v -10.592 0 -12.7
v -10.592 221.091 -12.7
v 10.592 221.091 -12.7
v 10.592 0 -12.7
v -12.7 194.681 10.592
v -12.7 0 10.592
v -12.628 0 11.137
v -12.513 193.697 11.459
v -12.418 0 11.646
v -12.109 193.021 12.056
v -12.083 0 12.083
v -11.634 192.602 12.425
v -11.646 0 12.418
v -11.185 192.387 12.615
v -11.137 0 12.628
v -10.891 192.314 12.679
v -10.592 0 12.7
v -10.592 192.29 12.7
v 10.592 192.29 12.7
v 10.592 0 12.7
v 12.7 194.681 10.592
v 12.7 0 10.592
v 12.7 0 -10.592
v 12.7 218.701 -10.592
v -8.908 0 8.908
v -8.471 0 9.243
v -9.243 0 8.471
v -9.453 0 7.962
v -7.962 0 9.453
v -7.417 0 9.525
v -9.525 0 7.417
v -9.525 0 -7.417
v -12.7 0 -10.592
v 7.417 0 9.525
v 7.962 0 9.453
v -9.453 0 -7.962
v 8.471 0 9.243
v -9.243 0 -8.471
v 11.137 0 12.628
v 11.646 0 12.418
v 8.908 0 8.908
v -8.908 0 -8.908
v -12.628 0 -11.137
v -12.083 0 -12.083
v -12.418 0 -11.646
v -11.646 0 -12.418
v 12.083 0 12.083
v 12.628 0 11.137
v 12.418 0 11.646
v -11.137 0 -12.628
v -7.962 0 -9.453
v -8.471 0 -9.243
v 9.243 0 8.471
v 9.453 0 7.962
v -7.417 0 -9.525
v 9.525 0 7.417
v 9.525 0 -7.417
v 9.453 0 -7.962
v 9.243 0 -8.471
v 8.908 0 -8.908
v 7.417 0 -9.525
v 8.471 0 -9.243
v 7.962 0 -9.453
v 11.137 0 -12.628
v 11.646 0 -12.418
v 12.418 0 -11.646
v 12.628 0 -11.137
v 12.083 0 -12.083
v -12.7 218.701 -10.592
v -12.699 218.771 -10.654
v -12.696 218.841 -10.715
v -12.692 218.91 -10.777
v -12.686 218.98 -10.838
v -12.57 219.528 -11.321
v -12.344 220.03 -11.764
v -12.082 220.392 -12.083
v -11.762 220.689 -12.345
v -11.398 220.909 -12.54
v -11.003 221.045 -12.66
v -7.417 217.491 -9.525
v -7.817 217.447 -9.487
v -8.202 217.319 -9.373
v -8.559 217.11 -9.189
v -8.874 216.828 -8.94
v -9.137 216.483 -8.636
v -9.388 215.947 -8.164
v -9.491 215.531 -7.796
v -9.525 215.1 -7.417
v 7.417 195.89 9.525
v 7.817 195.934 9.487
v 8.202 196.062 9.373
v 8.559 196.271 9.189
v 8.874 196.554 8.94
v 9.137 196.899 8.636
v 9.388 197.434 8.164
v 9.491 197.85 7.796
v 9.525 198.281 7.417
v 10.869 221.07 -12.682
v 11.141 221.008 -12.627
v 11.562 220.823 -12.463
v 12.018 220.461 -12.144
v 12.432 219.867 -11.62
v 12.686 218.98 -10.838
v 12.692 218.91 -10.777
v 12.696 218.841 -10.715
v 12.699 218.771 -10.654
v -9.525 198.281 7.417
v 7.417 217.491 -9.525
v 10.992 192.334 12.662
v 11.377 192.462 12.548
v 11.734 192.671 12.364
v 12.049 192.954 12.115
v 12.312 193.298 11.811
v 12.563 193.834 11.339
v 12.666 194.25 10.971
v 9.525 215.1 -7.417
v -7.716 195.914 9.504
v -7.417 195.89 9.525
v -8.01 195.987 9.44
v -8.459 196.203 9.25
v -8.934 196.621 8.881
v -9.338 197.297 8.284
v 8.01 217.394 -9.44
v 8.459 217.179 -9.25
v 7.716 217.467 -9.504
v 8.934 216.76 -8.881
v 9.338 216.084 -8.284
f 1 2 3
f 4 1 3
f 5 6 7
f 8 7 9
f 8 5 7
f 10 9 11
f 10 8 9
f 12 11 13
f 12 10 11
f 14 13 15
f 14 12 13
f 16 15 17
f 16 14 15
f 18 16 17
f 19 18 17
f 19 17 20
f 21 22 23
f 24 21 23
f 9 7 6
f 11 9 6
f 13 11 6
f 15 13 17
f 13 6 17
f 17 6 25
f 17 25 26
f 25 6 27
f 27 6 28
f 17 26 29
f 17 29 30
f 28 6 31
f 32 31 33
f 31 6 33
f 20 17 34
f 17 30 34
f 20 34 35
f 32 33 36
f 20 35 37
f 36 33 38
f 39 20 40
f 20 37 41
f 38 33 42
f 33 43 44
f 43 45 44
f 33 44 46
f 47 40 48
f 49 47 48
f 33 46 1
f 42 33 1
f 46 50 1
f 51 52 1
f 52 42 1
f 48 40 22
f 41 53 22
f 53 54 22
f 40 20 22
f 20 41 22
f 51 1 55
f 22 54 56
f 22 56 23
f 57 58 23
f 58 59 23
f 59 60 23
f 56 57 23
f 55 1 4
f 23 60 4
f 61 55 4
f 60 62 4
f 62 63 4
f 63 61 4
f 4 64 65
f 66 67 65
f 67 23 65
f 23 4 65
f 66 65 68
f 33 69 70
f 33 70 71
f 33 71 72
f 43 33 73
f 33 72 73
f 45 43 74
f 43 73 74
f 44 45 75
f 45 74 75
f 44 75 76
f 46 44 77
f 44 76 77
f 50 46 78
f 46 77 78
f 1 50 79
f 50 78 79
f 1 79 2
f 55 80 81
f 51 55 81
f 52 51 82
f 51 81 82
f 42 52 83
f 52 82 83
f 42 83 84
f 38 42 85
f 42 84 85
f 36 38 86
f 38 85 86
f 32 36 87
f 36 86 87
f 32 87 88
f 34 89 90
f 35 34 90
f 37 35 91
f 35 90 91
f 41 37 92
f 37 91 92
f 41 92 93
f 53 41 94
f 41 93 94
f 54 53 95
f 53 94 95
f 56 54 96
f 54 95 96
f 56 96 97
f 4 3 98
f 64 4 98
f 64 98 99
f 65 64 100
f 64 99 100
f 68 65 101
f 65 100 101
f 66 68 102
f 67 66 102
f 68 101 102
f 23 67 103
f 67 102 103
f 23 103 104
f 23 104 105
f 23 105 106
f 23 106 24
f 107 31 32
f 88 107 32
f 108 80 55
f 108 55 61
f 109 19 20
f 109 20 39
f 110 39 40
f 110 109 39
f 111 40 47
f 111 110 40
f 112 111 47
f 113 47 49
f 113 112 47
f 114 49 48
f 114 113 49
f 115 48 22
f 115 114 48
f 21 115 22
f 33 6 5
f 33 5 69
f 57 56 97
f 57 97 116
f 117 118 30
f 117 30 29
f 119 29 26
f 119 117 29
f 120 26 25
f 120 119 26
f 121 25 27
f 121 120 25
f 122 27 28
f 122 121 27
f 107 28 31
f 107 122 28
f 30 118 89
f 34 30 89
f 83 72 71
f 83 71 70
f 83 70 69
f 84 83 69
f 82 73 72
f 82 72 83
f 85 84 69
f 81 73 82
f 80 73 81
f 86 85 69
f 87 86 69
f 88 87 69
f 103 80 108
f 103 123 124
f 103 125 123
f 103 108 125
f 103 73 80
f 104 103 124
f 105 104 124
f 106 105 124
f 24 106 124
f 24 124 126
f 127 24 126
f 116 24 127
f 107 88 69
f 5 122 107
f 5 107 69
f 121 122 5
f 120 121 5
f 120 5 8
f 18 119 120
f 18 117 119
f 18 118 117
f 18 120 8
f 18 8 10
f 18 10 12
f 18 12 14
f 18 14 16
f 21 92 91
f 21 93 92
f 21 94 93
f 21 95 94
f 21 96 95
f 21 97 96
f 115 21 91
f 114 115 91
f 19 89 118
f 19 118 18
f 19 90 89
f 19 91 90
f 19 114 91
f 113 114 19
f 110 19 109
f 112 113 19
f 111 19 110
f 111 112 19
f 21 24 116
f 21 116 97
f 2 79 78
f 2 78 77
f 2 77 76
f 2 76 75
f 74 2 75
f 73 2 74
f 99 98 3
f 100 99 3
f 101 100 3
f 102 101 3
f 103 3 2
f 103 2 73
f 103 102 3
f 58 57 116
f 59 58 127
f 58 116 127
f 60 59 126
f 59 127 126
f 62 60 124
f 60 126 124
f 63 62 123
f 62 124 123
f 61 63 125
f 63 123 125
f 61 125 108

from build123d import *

# Parameters (mm, degrees)
SKETCH1_W           = 25.4
SKETCH1_H           = 25.4
SKETCH1_W_2         = 19.05
SKETCH1_H_2         = 19.05
BOSS_EXTRUDE1_DEPTH = 1219.2
FILLET1_R           = 2.1082
SKETCH2_OUTSIDE_W   = 271.346
SKETCH2_OUTSIDE_H   = 1465.146
SKETCH2_OUTSIDE_W_2 = 161.404490431
SKETCH2_OUTSIDE_H_2 = 228.6
CUT_EXTRUDE1_DEPTH  = 1220.530684321
CUT_EXTRUDE2_DEPTH  = 231.35713577


with BuildPart() as part:
    # Sketch1 → Boss-Extrude1 (new body)
    with BuildSketch(Plane(origin=(0, 0, 0), x_dir=(1, 0, 0), z_dir=(0, 1, 0))):
        Rectangle(SKETCH1_W, SKETCH1_H)
        Rectangle(SKETCH1_W_2, SKETCH1_H_2, mode=Mode.SUBTRACT)
    extrude(amount=BOSS_EXTRUDE1_DEPTH)

    # Fillet1
    fillet1_edges = [part.edges().sort_by_distance(p)[0] for p in [
        (9.525, 609.6, 9.525),
        (9.525, 609.6, -9.525),
        (-9.525, 609.6, -9.525),
        (-9.525, 609.6, 9.525),
        (-12.7, 609.6, -12.7),
        (12.7, 609.6, -12.7),
        (12.7, 609.6, 12.7),
        (-12.7, 609.6, 12.7),
    ]]
    fillet(fillet1_edges, radius=FILLET1_R)

    # Sketch2 outside → Cut-Extrude1 (cut, through all)
    with BuildSketch(Plane(origin=(12.7, 0, 0), x_dir=(0, 0, -1), z_dir=(1, 0, 0))):
        with Locations((0, 609.6)):
            Rectangle(SKETCH2_OUTSIDE_W, SKETCH2_OUTSIDE_H)
        with Locations((42.327264621, 114.3)):
            Rectangle(SKETCH2_OUTSIDE_W_2, SKETCH2_OUTSIDE_H_2, mode=Mode.SUBTRACT)
    extrude(amount=-CUT_EXTRUDE1_DEPTH, mode=Mode.SUBTRACT)

    # Sketch3 → Cut-Extrude2 (cut, through all)
    with BuildSketch(Plane(origin=(12.7, 0, 0), x_dir=(0, 0, -1), z_dir=(1, 0, 0))):
        Polygon((-201.676, 0), (-14.872954341, 211.814744127), (-14.872954341, 228.6), (-0.069750097, 228.6), (15.452852017, 246.200976383), (26.360882017, 236.580998158), (10.838279903, 218.980021775), (-190.76797, -9.619978225), align=None)
    extrude(amount=-CUT_EXTRUDE2_DEPTH, mode=Mode.SUBTRACT)


solid = part.part
